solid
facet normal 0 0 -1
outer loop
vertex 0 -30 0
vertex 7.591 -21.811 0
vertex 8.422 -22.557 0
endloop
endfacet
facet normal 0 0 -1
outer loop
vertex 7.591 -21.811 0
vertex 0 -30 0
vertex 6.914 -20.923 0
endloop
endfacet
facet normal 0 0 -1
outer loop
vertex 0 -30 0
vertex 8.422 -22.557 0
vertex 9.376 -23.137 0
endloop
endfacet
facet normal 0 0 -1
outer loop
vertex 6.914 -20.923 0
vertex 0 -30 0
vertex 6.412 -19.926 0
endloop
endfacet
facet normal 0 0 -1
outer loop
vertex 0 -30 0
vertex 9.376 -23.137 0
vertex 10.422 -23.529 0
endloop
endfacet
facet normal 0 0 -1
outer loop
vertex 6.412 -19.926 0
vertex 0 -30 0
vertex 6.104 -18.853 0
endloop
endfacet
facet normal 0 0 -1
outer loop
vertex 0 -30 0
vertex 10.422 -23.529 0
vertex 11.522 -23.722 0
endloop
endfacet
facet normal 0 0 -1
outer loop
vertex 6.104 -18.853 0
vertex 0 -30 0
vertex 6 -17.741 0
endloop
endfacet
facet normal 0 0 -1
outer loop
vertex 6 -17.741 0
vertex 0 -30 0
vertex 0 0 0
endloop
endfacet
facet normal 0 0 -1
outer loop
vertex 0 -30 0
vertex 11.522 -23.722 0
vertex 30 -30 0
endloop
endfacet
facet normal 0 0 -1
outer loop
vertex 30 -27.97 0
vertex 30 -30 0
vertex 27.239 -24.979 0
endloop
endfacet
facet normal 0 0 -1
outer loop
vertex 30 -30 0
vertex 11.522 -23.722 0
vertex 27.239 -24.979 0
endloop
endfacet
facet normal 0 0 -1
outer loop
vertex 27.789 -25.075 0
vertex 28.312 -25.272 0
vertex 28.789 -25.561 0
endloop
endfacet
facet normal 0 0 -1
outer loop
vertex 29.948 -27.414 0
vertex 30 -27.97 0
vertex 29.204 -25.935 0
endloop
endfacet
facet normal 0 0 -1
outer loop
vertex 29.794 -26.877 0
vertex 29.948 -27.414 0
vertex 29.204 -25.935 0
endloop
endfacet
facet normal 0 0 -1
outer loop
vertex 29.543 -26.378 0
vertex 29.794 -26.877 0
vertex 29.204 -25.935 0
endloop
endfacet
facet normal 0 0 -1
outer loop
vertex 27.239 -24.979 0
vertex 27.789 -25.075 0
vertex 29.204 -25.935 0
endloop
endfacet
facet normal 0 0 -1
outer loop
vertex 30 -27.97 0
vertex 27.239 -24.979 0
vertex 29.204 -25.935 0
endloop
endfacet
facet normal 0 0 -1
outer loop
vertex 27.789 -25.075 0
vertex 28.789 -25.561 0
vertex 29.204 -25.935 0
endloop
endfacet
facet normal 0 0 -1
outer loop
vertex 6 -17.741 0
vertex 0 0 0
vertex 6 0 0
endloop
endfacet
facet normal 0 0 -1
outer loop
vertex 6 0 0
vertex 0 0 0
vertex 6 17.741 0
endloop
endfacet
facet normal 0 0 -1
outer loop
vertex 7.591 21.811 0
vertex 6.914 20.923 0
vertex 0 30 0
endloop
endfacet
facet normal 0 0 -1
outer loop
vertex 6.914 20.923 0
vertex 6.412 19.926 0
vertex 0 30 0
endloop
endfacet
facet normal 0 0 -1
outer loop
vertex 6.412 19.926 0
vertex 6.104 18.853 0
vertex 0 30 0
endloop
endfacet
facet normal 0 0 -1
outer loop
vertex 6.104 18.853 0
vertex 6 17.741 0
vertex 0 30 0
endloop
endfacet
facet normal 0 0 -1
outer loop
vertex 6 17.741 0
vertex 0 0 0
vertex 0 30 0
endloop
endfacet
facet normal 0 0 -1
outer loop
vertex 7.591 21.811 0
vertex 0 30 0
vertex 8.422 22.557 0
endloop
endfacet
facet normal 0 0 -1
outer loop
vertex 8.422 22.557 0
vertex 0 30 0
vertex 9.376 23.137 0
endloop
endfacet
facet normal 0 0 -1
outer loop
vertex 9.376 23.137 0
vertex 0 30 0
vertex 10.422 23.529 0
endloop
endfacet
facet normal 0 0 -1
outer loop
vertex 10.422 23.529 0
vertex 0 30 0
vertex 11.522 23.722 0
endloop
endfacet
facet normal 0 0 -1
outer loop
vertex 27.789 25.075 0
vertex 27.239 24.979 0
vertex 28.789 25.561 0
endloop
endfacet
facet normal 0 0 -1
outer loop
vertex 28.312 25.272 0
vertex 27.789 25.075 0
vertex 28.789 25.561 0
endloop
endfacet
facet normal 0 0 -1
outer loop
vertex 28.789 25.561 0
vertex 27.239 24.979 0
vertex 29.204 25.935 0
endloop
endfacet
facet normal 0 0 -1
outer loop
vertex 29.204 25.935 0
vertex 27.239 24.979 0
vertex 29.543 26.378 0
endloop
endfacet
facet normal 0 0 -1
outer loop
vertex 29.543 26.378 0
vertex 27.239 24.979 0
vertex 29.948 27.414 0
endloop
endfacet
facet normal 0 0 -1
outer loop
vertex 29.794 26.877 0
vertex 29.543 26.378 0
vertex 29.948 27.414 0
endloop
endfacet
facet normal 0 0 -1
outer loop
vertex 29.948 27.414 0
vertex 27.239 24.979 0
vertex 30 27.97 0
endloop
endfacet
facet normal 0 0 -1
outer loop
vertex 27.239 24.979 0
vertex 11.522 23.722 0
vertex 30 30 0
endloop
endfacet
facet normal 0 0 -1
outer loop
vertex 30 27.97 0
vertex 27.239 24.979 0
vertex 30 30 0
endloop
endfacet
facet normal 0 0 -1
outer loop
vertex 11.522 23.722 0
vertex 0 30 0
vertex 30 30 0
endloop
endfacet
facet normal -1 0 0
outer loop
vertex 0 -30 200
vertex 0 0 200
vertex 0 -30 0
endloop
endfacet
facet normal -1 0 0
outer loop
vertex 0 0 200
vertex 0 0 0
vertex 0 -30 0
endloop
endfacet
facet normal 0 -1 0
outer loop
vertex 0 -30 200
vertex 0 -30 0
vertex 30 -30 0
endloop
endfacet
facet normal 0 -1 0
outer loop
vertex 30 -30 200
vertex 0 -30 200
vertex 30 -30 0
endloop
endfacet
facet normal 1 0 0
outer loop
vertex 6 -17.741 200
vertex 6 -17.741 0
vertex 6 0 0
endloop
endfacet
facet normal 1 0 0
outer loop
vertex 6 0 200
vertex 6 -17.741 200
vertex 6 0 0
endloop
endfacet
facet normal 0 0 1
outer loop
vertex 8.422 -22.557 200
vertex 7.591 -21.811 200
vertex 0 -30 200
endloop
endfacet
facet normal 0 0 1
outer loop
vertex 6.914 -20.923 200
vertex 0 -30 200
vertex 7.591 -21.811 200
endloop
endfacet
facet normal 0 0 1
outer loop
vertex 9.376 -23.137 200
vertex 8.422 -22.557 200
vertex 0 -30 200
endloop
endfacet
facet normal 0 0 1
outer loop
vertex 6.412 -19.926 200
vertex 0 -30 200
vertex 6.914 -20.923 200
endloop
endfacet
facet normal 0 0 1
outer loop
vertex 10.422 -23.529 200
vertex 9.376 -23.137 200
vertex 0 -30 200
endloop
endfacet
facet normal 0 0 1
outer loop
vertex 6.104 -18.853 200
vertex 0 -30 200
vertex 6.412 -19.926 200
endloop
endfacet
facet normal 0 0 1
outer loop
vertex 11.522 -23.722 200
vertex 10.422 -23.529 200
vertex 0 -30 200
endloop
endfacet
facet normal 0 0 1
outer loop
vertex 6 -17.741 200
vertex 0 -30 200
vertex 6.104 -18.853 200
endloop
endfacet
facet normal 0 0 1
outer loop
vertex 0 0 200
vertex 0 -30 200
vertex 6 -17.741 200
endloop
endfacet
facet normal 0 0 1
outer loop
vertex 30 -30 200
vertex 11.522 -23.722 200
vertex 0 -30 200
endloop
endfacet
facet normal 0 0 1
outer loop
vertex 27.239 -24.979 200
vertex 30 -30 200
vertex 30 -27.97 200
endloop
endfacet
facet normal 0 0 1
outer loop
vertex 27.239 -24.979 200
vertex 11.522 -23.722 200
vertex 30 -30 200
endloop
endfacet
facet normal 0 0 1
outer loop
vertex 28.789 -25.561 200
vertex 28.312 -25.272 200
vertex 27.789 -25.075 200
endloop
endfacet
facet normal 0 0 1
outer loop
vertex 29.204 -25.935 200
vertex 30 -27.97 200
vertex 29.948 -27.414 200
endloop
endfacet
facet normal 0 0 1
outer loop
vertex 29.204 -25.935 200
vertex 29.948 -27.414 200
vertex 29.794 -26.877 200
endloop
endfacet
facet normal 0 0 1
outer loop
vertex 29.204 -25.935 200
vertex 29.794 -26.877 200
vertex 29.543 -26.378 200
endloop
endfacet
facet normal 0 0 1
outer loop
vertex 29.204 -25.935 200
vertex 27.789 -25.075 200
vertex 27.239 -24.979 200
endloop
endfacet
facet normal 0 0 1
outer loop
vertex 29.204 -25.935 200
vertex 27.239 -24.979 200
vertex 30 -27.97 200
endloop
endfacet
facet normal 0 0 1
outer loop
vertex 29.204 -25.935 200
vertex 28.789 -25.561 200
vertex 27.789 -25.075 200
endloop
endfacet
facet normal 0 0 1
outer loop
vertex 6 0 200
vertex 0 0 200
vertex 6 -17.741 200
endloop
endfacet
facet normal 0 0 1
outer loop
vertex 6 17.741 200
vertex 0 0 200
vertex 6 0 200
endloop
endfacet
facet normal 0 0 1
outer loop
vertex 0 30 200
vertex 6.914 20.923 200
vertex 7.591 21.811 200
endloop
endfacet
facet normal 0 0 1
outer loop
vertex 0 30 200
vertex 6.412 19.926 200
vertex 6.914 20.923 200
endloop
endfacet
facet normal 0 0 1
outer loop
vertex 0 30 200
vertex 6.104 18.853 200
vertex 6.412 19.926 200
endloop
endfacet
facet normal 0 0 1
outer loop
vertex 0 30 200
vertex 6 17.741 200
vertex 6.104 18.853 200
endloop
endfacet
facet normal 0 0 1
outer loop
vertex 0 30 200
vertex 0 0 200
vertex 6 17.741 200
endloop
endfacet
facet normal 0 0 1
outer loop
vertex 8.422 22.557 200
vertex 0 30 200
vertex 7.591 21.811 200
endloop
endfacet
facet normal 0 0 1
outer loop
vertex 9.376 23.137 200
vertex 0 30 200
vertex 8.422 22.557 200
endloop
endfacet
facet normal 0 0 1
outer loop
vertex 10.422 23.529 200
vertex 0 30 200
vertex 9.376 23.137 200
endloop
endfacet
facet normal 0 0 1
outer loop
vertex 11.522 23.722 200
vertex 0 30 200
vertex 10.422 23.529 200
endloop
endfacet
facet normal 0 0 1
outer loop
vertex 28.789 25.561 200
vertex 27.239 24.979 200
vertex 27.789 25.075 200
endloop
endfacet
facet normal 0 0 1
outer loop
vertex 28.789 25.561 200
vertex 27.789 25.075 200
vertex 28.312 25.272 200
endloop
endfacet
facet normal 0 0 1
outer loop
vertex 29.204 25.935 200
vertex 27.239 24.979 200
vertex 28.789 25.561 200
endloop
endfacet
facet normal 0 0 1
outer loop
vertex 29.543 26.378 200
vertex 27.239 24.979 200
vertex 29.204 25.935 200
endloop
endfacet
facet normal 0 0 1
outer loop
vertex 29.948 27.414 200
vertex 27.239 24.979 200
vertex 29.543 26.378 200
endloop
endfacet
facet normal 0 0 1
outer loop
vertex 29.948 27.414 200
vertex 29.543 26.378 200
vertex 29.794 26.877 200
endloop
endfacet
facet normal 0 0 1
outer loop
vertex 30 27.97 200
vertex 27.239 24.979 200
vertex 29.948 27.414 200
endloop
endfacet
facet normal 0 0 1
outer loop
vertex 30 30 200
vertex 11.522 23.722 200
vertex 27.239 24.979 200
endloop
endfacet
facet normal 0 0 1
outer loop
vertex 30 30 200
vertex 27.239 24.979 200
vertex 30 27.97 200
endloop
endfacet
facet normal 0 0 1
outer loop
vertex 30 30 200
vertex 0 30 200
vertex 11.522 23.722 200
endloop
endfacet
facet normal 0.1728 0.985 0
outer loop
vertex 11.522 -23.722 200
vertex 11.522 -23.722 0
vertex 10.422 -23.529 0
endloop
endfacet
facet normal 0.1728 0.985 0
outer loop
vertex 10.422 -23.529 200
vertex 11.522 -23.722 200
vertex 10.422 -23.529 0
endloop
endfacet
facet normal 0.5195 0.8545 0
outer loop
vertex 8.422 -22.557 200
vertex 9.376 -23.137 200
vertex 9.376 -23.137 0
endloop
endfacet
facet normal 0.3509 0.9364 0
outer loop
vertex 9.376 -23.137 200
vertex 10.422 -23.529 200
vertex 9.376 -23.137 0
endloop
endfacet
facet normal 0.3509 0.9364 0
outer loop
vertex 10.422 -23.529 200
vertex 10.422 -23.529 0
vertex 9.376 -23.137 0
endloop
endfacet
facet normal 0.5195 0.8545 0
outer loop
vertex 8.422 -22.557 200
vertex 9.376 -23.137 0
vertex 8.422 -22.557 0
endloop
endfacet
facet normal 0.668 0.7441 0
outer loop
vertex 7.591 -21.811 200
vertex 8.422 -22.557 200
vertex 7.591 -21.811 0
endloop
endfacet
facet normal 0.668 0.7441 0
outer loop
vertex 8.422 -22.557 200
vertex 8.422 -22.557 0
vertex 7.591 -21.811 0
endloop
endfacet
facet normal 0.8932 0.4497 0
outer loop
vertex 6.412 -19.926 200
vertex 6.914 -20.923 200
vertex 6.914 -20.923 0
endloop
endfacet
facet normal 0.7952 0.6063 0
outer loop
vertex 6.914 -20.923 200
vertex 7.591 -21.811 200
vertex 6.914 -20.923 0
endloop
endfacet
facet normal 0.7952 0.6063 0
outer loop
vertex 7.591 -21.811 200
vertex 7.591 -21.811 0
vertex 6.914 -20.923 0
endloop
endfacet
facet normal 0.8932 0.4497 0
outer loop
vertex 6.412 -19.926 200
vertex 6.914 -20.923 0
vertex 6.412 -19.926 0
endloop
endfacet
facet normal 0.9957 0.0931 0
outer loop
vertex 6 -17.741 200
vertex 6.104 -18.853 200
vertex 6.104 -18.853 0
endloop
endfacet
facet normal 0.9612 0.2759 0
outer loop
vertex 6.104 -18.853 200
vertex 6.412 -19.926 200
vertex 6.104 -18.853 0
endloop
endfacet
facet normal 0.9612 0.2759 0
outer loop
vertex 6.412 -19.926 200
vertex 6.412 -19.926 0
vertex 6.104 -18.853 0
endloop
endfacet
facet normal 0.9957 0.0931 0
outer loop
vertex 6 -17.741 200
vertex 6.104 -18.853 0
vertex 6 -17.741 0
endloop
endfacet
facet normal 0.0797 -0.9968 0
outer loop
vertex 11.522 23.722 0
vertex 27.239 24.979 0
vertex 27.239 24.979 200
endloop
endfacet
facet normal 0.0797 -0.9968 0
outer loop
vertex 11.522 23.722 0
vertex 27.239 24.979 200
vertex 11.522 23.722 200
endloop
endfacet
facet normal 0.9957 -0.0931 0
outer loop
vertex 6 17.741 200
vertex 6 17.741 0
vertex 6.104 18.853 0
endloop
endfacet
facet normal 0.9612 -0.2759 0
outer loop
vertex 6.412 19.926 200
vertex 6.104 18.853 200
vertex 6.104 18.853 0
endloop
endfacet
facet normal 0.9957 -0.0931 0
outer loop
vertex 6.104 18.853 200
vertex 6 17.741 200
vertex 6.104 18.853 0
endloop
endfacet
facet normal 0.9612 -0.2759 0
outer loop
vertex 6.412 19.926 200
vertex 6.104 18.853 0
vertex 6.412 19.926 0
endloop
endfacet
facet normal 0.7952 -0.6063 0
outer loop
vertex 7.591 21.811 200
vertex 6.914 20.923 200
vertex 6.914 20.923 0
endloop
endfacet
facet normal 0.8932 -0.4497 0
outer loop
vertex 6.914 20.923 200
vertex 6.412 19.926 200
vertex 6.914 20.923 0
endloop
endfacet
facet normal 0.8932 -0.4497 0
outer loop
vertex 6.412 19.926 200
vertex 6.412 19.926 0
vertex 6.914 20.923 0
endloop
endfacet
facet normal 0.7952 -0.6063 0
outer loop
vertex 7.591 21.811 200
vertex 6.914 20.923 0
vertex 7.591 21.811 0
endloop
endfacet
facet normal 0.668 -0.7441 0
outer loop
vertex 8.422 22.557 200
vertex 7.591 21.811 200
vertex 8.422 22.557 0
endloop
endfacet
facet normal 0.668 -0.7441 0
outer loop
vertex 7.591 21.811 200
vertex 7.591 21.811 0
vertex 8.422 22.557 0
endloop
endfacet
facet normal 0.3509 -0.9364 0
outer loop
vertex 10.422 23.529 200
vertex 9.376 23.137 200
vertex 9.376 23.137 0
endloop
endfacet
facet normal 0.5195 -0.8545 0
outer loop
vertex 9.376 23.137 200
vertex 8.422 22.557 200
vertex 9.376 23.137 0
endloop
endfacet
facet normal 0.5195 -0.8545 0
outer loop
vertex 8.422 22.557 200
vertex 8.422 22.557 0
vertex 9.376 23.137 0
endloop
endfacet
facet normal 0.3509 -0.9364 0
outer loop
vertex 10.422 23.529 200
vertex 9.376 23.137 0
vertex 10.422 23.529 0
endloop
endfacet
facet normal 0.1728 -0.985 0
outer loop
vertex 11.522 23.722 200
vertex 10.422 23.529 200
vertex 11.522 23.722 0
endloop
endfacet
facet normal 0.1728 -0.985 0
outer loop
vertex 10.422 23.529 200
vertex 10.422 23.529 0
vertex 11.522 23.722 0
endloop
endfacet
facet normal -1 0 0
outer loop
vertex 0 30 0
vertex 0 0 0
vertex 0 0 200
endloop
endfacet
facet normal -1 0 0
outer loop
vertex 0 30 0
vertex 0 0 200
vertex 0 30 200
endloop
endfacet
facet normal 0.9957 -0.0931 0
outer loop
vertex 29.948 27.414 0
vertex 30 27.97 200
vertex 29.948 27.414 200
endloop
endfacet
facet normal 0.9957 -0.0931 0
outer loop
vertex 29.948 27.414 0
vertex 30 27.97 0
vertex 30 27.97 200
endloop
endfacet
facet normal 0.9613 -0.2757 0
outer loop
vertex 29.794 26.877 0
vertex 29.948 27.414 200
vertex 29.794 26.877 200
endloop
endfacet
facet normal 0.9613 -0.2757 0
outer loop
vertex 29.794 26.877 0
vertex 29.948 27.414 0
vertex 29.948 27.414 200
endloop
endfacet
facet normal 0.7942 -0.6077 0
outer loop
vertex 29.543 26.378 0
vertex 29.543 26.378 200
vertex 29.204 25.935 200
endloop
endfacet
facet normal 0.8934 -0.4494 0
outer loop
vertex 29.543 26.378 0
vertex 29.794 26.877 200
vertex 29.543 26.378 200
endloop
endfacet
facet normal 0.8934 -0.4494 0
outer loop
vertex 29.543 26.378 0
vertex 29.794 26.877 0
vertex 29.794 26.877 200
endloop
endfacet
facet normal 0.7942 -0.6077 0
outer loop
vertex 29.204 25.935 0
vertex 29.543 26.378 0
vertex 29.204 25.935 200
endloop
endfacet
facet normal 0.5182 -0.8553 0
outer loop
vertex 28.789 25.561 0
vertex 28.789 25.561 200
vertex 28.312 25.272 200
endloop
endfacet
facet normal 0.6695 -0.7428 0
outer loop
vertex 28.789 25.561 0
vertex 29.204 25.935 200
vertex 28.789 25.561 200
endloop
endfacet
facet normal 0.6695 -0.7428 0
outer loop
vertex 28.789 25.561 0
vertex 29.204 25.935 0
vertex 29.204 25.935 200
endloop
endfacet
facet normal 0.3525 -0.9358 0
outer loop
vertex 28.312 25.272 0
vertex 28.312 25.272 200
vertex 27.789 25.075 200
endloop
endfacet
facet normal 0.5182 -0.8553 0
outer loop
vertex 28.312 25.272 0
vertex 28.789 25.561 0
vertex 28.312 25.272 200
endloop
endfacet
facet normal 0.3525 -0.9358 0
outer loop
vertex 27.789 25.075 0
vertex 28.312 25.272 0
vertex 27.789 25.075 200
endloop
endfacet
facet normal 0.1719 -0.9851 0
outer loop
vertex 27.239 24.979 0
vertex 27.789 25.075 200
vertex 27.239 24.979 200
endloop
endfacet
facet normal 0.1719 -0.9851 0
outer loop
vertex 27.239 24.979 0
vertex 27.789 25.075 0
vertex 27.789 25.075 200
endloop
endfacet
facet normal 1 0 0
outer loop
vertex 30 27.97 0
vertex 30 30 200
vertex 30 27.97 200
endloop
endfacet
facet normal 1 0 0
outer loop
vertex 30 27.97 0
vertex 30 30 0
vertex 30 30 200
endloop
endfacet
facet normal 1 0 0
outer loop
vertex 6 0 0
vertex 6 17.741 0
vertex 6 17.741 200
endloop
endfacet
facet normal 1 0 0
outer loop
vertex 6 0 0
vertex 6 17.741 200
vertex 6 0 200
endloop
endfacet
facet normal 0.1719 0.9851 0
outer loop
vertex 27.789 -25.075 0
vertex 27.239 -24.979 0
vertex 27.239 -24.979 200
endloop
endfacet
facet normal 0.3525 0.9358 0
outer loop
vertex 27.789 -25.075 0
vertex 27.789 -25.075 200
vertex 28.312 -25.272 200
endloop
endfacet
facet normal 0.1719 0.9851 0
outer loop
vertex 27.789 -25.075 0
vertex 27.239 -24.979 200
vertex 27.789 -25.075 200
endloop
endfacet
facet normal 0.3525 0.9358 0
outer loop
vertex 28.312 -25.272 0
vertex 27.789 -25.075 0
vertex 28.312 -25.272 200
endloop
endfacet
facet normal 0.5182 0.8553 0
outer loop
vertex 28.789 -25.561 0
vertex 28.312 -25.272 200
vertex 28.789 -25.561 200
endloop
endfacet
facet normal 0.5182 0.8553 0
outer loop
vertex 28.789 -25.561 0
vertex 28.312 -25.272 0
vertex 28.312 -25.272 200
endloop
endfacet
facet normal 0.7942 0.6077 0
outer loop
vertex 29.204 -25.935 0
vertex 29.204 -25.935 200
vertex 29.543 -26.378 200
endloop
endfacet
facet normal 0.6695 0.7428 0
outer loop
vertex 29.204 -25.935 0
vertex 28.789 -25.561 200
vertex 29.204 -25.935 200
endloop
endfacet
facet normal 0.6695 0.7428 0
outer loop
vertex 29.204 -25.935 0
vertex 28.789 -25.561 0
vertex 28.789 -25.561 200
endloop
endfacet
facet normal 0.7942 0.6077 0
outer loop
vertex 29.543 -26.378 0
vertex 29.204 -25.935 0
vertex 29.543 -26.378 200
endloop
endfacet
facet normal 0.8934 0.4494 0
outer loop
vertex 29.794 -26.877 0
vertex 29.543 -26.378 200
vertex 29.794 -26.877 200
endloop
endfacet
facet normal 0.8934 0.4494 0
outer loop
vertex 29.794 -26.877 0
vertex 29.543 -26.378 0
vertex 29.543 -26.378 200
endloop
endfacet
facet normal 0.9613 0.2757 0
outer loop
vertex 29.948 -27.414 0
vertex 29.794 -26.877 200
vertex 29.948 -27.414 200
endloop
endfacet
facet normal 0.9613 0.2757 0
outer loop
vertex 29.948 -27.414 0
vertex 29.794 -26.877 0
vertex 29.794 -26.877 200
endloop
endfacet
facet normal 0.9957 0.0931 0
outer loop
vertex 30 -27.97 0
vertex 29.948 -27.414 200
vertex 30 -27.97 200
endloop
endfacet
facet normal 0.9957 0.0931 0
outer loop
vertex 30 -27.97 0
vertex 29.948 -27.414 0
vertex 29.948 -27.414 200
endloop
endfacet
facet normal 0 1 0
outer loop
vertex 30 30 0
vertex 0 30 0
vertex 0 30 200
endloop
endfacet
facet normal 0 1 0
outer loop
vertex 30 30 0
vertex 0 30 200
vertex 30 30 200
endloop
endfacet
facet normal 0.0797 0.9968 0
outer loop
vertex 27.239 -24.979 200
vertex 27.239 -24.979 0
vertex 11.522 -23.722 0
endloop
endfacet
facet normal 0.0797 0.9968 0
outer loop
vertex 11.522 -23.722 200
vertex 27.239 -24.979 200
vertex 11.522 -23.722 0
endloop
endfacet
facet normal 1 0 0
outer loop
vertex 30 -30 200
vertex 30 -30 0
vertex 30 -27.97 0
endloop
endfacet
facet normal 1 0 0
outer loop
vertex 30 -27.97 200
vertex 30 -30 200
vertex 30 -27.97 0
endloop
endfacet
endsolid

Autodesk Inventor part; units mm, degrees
ref_plane "YZ Plane" through (0, 0, 0) normal (1, 0, 0) x (0, 1, 0)
ref_plane "Start plane" through (0, 0, 0) normal (0, 0, 1) x (1, 0, 0)
ref_plane "End plane" through (0, 0, 350) normal (0, 0, 1) x (1, 0, 0)
sketch "Sketch" plane through (0, 0, 0) normal (0, 0, 1) x (1, 0, 0)
  line L0 (0, 0) -> (0, 30)
  line L1 (0, 30) -> (30, 30)
  line L2 (30, 30) -> (30, 27.9696)
  line L3 (27.2392, 24.9791) -> (11.5215, 23.7217)
  line L4 (6, 17.7408) -> (6, 0)
  line L5 (6, 0) -> (0, 0) construction
  line L6 (15, 30) -> (15, 24) construction
  line L7 (30, 25.2) -> (30, 24) construction
  line L8 (30, 24) -> (15, 24) construction
  line L9 (0, 15) -> (0, -27) construction
  line L10 (-5.539, 0) -> (16.0067, 0) construction
  line L11 (0, 0) -> (0, -30)
  line L12 (0, -30) -> (30, -30)
  line L13 (30, -30) -> (30, -27.9696)
  line L14 (27.2392, -24.9791) -> (11.5215, -23.7217)
  line L15 (6, -17.7408) -> (6, 0)
  arc A0 (11.5215, 23.7217) -> (6, 17.7408) centre (12, 17.7408) ccw
  arc A1 (6, -17.7408) -> (11.5215, -23.7217) centre (12, -17.7408) ccw
  arc A2 (27.2392, 24.9791) -> (30, 27.9696) centre (27, 27.9696) ccw
  arc A3 (30, -27.9696) -> (27.2392, -24.9791) centre (27, -27.9696) ccw
  line L16 (0, 42) -> (0, -42) construction
  line L17 (-12.7637, 0) -> (37.8094, 0) construction
  point P0 (6, 23.28)
  point P1 (30, -25.2)
  point P2 (6, -23.28)
  point P3 (15, -30)
  point P4 (15, -24)
  dimension "d0" = 6
  dimension "d1" = 30
  dimension "d2" = 30
  dimension "d3" = 6
  dimension "d4" = 15
  dimension "d5" = 1.2
  dimension "d23" = 6
  dimension "d24" = 3
  dimension "d25" = 0
extrude "Body" add sketch "Sketch" along normal blind 200
sketch "Sketch3" plane through (0, 0, 0) normal (0, 0, 1) x (1, 0, 0)
  line L0 (0, 0) -> (10, 0)
ref_plane "Work Plane3" through (0, 0, 0) normal (0, -1, 0) x (1, 0, 0)
sketch "Sketch4" plane through (0, 0, 0) normal (0, -1, 0) x (1, 0, 0)
  line L0 (-2, 0) -> (12, 0)
  line L1 (-2, 350) -> (12, 350)
  dimension "d29" = 350
equation "\"d0\" = G_T"
equation "\"d1\" = 0.5 * G_H"
equation "\"d2\" = G_W"
equation "\"d3\" = G_T1"
equation "\"d4\" = G_C"
equation "\"d23\" = G_IR"
equation "\"d24\" = G_ER"
equation "\"G_W\" = 30"
equation "\"G_T\" = 6"
equation "\"G_T1\" = 6"
equation "\"G_NG\" = 0.08"
equation "\"G_ER\" = 3"
equation "\"G_IR\" = 6"
equation "\"G_C\" = 15"
equation "\"G_L\" = d29"
equation "\"ex\" = 0"
equation "\"G_OFFSET_START\" = 0"
equation "\"G_OFFSET_END\" = 0"
equation "\"G_H\" = 60"
properties part number "DIN1026-1 - U 60 - 350" material "Steel, Mild"
